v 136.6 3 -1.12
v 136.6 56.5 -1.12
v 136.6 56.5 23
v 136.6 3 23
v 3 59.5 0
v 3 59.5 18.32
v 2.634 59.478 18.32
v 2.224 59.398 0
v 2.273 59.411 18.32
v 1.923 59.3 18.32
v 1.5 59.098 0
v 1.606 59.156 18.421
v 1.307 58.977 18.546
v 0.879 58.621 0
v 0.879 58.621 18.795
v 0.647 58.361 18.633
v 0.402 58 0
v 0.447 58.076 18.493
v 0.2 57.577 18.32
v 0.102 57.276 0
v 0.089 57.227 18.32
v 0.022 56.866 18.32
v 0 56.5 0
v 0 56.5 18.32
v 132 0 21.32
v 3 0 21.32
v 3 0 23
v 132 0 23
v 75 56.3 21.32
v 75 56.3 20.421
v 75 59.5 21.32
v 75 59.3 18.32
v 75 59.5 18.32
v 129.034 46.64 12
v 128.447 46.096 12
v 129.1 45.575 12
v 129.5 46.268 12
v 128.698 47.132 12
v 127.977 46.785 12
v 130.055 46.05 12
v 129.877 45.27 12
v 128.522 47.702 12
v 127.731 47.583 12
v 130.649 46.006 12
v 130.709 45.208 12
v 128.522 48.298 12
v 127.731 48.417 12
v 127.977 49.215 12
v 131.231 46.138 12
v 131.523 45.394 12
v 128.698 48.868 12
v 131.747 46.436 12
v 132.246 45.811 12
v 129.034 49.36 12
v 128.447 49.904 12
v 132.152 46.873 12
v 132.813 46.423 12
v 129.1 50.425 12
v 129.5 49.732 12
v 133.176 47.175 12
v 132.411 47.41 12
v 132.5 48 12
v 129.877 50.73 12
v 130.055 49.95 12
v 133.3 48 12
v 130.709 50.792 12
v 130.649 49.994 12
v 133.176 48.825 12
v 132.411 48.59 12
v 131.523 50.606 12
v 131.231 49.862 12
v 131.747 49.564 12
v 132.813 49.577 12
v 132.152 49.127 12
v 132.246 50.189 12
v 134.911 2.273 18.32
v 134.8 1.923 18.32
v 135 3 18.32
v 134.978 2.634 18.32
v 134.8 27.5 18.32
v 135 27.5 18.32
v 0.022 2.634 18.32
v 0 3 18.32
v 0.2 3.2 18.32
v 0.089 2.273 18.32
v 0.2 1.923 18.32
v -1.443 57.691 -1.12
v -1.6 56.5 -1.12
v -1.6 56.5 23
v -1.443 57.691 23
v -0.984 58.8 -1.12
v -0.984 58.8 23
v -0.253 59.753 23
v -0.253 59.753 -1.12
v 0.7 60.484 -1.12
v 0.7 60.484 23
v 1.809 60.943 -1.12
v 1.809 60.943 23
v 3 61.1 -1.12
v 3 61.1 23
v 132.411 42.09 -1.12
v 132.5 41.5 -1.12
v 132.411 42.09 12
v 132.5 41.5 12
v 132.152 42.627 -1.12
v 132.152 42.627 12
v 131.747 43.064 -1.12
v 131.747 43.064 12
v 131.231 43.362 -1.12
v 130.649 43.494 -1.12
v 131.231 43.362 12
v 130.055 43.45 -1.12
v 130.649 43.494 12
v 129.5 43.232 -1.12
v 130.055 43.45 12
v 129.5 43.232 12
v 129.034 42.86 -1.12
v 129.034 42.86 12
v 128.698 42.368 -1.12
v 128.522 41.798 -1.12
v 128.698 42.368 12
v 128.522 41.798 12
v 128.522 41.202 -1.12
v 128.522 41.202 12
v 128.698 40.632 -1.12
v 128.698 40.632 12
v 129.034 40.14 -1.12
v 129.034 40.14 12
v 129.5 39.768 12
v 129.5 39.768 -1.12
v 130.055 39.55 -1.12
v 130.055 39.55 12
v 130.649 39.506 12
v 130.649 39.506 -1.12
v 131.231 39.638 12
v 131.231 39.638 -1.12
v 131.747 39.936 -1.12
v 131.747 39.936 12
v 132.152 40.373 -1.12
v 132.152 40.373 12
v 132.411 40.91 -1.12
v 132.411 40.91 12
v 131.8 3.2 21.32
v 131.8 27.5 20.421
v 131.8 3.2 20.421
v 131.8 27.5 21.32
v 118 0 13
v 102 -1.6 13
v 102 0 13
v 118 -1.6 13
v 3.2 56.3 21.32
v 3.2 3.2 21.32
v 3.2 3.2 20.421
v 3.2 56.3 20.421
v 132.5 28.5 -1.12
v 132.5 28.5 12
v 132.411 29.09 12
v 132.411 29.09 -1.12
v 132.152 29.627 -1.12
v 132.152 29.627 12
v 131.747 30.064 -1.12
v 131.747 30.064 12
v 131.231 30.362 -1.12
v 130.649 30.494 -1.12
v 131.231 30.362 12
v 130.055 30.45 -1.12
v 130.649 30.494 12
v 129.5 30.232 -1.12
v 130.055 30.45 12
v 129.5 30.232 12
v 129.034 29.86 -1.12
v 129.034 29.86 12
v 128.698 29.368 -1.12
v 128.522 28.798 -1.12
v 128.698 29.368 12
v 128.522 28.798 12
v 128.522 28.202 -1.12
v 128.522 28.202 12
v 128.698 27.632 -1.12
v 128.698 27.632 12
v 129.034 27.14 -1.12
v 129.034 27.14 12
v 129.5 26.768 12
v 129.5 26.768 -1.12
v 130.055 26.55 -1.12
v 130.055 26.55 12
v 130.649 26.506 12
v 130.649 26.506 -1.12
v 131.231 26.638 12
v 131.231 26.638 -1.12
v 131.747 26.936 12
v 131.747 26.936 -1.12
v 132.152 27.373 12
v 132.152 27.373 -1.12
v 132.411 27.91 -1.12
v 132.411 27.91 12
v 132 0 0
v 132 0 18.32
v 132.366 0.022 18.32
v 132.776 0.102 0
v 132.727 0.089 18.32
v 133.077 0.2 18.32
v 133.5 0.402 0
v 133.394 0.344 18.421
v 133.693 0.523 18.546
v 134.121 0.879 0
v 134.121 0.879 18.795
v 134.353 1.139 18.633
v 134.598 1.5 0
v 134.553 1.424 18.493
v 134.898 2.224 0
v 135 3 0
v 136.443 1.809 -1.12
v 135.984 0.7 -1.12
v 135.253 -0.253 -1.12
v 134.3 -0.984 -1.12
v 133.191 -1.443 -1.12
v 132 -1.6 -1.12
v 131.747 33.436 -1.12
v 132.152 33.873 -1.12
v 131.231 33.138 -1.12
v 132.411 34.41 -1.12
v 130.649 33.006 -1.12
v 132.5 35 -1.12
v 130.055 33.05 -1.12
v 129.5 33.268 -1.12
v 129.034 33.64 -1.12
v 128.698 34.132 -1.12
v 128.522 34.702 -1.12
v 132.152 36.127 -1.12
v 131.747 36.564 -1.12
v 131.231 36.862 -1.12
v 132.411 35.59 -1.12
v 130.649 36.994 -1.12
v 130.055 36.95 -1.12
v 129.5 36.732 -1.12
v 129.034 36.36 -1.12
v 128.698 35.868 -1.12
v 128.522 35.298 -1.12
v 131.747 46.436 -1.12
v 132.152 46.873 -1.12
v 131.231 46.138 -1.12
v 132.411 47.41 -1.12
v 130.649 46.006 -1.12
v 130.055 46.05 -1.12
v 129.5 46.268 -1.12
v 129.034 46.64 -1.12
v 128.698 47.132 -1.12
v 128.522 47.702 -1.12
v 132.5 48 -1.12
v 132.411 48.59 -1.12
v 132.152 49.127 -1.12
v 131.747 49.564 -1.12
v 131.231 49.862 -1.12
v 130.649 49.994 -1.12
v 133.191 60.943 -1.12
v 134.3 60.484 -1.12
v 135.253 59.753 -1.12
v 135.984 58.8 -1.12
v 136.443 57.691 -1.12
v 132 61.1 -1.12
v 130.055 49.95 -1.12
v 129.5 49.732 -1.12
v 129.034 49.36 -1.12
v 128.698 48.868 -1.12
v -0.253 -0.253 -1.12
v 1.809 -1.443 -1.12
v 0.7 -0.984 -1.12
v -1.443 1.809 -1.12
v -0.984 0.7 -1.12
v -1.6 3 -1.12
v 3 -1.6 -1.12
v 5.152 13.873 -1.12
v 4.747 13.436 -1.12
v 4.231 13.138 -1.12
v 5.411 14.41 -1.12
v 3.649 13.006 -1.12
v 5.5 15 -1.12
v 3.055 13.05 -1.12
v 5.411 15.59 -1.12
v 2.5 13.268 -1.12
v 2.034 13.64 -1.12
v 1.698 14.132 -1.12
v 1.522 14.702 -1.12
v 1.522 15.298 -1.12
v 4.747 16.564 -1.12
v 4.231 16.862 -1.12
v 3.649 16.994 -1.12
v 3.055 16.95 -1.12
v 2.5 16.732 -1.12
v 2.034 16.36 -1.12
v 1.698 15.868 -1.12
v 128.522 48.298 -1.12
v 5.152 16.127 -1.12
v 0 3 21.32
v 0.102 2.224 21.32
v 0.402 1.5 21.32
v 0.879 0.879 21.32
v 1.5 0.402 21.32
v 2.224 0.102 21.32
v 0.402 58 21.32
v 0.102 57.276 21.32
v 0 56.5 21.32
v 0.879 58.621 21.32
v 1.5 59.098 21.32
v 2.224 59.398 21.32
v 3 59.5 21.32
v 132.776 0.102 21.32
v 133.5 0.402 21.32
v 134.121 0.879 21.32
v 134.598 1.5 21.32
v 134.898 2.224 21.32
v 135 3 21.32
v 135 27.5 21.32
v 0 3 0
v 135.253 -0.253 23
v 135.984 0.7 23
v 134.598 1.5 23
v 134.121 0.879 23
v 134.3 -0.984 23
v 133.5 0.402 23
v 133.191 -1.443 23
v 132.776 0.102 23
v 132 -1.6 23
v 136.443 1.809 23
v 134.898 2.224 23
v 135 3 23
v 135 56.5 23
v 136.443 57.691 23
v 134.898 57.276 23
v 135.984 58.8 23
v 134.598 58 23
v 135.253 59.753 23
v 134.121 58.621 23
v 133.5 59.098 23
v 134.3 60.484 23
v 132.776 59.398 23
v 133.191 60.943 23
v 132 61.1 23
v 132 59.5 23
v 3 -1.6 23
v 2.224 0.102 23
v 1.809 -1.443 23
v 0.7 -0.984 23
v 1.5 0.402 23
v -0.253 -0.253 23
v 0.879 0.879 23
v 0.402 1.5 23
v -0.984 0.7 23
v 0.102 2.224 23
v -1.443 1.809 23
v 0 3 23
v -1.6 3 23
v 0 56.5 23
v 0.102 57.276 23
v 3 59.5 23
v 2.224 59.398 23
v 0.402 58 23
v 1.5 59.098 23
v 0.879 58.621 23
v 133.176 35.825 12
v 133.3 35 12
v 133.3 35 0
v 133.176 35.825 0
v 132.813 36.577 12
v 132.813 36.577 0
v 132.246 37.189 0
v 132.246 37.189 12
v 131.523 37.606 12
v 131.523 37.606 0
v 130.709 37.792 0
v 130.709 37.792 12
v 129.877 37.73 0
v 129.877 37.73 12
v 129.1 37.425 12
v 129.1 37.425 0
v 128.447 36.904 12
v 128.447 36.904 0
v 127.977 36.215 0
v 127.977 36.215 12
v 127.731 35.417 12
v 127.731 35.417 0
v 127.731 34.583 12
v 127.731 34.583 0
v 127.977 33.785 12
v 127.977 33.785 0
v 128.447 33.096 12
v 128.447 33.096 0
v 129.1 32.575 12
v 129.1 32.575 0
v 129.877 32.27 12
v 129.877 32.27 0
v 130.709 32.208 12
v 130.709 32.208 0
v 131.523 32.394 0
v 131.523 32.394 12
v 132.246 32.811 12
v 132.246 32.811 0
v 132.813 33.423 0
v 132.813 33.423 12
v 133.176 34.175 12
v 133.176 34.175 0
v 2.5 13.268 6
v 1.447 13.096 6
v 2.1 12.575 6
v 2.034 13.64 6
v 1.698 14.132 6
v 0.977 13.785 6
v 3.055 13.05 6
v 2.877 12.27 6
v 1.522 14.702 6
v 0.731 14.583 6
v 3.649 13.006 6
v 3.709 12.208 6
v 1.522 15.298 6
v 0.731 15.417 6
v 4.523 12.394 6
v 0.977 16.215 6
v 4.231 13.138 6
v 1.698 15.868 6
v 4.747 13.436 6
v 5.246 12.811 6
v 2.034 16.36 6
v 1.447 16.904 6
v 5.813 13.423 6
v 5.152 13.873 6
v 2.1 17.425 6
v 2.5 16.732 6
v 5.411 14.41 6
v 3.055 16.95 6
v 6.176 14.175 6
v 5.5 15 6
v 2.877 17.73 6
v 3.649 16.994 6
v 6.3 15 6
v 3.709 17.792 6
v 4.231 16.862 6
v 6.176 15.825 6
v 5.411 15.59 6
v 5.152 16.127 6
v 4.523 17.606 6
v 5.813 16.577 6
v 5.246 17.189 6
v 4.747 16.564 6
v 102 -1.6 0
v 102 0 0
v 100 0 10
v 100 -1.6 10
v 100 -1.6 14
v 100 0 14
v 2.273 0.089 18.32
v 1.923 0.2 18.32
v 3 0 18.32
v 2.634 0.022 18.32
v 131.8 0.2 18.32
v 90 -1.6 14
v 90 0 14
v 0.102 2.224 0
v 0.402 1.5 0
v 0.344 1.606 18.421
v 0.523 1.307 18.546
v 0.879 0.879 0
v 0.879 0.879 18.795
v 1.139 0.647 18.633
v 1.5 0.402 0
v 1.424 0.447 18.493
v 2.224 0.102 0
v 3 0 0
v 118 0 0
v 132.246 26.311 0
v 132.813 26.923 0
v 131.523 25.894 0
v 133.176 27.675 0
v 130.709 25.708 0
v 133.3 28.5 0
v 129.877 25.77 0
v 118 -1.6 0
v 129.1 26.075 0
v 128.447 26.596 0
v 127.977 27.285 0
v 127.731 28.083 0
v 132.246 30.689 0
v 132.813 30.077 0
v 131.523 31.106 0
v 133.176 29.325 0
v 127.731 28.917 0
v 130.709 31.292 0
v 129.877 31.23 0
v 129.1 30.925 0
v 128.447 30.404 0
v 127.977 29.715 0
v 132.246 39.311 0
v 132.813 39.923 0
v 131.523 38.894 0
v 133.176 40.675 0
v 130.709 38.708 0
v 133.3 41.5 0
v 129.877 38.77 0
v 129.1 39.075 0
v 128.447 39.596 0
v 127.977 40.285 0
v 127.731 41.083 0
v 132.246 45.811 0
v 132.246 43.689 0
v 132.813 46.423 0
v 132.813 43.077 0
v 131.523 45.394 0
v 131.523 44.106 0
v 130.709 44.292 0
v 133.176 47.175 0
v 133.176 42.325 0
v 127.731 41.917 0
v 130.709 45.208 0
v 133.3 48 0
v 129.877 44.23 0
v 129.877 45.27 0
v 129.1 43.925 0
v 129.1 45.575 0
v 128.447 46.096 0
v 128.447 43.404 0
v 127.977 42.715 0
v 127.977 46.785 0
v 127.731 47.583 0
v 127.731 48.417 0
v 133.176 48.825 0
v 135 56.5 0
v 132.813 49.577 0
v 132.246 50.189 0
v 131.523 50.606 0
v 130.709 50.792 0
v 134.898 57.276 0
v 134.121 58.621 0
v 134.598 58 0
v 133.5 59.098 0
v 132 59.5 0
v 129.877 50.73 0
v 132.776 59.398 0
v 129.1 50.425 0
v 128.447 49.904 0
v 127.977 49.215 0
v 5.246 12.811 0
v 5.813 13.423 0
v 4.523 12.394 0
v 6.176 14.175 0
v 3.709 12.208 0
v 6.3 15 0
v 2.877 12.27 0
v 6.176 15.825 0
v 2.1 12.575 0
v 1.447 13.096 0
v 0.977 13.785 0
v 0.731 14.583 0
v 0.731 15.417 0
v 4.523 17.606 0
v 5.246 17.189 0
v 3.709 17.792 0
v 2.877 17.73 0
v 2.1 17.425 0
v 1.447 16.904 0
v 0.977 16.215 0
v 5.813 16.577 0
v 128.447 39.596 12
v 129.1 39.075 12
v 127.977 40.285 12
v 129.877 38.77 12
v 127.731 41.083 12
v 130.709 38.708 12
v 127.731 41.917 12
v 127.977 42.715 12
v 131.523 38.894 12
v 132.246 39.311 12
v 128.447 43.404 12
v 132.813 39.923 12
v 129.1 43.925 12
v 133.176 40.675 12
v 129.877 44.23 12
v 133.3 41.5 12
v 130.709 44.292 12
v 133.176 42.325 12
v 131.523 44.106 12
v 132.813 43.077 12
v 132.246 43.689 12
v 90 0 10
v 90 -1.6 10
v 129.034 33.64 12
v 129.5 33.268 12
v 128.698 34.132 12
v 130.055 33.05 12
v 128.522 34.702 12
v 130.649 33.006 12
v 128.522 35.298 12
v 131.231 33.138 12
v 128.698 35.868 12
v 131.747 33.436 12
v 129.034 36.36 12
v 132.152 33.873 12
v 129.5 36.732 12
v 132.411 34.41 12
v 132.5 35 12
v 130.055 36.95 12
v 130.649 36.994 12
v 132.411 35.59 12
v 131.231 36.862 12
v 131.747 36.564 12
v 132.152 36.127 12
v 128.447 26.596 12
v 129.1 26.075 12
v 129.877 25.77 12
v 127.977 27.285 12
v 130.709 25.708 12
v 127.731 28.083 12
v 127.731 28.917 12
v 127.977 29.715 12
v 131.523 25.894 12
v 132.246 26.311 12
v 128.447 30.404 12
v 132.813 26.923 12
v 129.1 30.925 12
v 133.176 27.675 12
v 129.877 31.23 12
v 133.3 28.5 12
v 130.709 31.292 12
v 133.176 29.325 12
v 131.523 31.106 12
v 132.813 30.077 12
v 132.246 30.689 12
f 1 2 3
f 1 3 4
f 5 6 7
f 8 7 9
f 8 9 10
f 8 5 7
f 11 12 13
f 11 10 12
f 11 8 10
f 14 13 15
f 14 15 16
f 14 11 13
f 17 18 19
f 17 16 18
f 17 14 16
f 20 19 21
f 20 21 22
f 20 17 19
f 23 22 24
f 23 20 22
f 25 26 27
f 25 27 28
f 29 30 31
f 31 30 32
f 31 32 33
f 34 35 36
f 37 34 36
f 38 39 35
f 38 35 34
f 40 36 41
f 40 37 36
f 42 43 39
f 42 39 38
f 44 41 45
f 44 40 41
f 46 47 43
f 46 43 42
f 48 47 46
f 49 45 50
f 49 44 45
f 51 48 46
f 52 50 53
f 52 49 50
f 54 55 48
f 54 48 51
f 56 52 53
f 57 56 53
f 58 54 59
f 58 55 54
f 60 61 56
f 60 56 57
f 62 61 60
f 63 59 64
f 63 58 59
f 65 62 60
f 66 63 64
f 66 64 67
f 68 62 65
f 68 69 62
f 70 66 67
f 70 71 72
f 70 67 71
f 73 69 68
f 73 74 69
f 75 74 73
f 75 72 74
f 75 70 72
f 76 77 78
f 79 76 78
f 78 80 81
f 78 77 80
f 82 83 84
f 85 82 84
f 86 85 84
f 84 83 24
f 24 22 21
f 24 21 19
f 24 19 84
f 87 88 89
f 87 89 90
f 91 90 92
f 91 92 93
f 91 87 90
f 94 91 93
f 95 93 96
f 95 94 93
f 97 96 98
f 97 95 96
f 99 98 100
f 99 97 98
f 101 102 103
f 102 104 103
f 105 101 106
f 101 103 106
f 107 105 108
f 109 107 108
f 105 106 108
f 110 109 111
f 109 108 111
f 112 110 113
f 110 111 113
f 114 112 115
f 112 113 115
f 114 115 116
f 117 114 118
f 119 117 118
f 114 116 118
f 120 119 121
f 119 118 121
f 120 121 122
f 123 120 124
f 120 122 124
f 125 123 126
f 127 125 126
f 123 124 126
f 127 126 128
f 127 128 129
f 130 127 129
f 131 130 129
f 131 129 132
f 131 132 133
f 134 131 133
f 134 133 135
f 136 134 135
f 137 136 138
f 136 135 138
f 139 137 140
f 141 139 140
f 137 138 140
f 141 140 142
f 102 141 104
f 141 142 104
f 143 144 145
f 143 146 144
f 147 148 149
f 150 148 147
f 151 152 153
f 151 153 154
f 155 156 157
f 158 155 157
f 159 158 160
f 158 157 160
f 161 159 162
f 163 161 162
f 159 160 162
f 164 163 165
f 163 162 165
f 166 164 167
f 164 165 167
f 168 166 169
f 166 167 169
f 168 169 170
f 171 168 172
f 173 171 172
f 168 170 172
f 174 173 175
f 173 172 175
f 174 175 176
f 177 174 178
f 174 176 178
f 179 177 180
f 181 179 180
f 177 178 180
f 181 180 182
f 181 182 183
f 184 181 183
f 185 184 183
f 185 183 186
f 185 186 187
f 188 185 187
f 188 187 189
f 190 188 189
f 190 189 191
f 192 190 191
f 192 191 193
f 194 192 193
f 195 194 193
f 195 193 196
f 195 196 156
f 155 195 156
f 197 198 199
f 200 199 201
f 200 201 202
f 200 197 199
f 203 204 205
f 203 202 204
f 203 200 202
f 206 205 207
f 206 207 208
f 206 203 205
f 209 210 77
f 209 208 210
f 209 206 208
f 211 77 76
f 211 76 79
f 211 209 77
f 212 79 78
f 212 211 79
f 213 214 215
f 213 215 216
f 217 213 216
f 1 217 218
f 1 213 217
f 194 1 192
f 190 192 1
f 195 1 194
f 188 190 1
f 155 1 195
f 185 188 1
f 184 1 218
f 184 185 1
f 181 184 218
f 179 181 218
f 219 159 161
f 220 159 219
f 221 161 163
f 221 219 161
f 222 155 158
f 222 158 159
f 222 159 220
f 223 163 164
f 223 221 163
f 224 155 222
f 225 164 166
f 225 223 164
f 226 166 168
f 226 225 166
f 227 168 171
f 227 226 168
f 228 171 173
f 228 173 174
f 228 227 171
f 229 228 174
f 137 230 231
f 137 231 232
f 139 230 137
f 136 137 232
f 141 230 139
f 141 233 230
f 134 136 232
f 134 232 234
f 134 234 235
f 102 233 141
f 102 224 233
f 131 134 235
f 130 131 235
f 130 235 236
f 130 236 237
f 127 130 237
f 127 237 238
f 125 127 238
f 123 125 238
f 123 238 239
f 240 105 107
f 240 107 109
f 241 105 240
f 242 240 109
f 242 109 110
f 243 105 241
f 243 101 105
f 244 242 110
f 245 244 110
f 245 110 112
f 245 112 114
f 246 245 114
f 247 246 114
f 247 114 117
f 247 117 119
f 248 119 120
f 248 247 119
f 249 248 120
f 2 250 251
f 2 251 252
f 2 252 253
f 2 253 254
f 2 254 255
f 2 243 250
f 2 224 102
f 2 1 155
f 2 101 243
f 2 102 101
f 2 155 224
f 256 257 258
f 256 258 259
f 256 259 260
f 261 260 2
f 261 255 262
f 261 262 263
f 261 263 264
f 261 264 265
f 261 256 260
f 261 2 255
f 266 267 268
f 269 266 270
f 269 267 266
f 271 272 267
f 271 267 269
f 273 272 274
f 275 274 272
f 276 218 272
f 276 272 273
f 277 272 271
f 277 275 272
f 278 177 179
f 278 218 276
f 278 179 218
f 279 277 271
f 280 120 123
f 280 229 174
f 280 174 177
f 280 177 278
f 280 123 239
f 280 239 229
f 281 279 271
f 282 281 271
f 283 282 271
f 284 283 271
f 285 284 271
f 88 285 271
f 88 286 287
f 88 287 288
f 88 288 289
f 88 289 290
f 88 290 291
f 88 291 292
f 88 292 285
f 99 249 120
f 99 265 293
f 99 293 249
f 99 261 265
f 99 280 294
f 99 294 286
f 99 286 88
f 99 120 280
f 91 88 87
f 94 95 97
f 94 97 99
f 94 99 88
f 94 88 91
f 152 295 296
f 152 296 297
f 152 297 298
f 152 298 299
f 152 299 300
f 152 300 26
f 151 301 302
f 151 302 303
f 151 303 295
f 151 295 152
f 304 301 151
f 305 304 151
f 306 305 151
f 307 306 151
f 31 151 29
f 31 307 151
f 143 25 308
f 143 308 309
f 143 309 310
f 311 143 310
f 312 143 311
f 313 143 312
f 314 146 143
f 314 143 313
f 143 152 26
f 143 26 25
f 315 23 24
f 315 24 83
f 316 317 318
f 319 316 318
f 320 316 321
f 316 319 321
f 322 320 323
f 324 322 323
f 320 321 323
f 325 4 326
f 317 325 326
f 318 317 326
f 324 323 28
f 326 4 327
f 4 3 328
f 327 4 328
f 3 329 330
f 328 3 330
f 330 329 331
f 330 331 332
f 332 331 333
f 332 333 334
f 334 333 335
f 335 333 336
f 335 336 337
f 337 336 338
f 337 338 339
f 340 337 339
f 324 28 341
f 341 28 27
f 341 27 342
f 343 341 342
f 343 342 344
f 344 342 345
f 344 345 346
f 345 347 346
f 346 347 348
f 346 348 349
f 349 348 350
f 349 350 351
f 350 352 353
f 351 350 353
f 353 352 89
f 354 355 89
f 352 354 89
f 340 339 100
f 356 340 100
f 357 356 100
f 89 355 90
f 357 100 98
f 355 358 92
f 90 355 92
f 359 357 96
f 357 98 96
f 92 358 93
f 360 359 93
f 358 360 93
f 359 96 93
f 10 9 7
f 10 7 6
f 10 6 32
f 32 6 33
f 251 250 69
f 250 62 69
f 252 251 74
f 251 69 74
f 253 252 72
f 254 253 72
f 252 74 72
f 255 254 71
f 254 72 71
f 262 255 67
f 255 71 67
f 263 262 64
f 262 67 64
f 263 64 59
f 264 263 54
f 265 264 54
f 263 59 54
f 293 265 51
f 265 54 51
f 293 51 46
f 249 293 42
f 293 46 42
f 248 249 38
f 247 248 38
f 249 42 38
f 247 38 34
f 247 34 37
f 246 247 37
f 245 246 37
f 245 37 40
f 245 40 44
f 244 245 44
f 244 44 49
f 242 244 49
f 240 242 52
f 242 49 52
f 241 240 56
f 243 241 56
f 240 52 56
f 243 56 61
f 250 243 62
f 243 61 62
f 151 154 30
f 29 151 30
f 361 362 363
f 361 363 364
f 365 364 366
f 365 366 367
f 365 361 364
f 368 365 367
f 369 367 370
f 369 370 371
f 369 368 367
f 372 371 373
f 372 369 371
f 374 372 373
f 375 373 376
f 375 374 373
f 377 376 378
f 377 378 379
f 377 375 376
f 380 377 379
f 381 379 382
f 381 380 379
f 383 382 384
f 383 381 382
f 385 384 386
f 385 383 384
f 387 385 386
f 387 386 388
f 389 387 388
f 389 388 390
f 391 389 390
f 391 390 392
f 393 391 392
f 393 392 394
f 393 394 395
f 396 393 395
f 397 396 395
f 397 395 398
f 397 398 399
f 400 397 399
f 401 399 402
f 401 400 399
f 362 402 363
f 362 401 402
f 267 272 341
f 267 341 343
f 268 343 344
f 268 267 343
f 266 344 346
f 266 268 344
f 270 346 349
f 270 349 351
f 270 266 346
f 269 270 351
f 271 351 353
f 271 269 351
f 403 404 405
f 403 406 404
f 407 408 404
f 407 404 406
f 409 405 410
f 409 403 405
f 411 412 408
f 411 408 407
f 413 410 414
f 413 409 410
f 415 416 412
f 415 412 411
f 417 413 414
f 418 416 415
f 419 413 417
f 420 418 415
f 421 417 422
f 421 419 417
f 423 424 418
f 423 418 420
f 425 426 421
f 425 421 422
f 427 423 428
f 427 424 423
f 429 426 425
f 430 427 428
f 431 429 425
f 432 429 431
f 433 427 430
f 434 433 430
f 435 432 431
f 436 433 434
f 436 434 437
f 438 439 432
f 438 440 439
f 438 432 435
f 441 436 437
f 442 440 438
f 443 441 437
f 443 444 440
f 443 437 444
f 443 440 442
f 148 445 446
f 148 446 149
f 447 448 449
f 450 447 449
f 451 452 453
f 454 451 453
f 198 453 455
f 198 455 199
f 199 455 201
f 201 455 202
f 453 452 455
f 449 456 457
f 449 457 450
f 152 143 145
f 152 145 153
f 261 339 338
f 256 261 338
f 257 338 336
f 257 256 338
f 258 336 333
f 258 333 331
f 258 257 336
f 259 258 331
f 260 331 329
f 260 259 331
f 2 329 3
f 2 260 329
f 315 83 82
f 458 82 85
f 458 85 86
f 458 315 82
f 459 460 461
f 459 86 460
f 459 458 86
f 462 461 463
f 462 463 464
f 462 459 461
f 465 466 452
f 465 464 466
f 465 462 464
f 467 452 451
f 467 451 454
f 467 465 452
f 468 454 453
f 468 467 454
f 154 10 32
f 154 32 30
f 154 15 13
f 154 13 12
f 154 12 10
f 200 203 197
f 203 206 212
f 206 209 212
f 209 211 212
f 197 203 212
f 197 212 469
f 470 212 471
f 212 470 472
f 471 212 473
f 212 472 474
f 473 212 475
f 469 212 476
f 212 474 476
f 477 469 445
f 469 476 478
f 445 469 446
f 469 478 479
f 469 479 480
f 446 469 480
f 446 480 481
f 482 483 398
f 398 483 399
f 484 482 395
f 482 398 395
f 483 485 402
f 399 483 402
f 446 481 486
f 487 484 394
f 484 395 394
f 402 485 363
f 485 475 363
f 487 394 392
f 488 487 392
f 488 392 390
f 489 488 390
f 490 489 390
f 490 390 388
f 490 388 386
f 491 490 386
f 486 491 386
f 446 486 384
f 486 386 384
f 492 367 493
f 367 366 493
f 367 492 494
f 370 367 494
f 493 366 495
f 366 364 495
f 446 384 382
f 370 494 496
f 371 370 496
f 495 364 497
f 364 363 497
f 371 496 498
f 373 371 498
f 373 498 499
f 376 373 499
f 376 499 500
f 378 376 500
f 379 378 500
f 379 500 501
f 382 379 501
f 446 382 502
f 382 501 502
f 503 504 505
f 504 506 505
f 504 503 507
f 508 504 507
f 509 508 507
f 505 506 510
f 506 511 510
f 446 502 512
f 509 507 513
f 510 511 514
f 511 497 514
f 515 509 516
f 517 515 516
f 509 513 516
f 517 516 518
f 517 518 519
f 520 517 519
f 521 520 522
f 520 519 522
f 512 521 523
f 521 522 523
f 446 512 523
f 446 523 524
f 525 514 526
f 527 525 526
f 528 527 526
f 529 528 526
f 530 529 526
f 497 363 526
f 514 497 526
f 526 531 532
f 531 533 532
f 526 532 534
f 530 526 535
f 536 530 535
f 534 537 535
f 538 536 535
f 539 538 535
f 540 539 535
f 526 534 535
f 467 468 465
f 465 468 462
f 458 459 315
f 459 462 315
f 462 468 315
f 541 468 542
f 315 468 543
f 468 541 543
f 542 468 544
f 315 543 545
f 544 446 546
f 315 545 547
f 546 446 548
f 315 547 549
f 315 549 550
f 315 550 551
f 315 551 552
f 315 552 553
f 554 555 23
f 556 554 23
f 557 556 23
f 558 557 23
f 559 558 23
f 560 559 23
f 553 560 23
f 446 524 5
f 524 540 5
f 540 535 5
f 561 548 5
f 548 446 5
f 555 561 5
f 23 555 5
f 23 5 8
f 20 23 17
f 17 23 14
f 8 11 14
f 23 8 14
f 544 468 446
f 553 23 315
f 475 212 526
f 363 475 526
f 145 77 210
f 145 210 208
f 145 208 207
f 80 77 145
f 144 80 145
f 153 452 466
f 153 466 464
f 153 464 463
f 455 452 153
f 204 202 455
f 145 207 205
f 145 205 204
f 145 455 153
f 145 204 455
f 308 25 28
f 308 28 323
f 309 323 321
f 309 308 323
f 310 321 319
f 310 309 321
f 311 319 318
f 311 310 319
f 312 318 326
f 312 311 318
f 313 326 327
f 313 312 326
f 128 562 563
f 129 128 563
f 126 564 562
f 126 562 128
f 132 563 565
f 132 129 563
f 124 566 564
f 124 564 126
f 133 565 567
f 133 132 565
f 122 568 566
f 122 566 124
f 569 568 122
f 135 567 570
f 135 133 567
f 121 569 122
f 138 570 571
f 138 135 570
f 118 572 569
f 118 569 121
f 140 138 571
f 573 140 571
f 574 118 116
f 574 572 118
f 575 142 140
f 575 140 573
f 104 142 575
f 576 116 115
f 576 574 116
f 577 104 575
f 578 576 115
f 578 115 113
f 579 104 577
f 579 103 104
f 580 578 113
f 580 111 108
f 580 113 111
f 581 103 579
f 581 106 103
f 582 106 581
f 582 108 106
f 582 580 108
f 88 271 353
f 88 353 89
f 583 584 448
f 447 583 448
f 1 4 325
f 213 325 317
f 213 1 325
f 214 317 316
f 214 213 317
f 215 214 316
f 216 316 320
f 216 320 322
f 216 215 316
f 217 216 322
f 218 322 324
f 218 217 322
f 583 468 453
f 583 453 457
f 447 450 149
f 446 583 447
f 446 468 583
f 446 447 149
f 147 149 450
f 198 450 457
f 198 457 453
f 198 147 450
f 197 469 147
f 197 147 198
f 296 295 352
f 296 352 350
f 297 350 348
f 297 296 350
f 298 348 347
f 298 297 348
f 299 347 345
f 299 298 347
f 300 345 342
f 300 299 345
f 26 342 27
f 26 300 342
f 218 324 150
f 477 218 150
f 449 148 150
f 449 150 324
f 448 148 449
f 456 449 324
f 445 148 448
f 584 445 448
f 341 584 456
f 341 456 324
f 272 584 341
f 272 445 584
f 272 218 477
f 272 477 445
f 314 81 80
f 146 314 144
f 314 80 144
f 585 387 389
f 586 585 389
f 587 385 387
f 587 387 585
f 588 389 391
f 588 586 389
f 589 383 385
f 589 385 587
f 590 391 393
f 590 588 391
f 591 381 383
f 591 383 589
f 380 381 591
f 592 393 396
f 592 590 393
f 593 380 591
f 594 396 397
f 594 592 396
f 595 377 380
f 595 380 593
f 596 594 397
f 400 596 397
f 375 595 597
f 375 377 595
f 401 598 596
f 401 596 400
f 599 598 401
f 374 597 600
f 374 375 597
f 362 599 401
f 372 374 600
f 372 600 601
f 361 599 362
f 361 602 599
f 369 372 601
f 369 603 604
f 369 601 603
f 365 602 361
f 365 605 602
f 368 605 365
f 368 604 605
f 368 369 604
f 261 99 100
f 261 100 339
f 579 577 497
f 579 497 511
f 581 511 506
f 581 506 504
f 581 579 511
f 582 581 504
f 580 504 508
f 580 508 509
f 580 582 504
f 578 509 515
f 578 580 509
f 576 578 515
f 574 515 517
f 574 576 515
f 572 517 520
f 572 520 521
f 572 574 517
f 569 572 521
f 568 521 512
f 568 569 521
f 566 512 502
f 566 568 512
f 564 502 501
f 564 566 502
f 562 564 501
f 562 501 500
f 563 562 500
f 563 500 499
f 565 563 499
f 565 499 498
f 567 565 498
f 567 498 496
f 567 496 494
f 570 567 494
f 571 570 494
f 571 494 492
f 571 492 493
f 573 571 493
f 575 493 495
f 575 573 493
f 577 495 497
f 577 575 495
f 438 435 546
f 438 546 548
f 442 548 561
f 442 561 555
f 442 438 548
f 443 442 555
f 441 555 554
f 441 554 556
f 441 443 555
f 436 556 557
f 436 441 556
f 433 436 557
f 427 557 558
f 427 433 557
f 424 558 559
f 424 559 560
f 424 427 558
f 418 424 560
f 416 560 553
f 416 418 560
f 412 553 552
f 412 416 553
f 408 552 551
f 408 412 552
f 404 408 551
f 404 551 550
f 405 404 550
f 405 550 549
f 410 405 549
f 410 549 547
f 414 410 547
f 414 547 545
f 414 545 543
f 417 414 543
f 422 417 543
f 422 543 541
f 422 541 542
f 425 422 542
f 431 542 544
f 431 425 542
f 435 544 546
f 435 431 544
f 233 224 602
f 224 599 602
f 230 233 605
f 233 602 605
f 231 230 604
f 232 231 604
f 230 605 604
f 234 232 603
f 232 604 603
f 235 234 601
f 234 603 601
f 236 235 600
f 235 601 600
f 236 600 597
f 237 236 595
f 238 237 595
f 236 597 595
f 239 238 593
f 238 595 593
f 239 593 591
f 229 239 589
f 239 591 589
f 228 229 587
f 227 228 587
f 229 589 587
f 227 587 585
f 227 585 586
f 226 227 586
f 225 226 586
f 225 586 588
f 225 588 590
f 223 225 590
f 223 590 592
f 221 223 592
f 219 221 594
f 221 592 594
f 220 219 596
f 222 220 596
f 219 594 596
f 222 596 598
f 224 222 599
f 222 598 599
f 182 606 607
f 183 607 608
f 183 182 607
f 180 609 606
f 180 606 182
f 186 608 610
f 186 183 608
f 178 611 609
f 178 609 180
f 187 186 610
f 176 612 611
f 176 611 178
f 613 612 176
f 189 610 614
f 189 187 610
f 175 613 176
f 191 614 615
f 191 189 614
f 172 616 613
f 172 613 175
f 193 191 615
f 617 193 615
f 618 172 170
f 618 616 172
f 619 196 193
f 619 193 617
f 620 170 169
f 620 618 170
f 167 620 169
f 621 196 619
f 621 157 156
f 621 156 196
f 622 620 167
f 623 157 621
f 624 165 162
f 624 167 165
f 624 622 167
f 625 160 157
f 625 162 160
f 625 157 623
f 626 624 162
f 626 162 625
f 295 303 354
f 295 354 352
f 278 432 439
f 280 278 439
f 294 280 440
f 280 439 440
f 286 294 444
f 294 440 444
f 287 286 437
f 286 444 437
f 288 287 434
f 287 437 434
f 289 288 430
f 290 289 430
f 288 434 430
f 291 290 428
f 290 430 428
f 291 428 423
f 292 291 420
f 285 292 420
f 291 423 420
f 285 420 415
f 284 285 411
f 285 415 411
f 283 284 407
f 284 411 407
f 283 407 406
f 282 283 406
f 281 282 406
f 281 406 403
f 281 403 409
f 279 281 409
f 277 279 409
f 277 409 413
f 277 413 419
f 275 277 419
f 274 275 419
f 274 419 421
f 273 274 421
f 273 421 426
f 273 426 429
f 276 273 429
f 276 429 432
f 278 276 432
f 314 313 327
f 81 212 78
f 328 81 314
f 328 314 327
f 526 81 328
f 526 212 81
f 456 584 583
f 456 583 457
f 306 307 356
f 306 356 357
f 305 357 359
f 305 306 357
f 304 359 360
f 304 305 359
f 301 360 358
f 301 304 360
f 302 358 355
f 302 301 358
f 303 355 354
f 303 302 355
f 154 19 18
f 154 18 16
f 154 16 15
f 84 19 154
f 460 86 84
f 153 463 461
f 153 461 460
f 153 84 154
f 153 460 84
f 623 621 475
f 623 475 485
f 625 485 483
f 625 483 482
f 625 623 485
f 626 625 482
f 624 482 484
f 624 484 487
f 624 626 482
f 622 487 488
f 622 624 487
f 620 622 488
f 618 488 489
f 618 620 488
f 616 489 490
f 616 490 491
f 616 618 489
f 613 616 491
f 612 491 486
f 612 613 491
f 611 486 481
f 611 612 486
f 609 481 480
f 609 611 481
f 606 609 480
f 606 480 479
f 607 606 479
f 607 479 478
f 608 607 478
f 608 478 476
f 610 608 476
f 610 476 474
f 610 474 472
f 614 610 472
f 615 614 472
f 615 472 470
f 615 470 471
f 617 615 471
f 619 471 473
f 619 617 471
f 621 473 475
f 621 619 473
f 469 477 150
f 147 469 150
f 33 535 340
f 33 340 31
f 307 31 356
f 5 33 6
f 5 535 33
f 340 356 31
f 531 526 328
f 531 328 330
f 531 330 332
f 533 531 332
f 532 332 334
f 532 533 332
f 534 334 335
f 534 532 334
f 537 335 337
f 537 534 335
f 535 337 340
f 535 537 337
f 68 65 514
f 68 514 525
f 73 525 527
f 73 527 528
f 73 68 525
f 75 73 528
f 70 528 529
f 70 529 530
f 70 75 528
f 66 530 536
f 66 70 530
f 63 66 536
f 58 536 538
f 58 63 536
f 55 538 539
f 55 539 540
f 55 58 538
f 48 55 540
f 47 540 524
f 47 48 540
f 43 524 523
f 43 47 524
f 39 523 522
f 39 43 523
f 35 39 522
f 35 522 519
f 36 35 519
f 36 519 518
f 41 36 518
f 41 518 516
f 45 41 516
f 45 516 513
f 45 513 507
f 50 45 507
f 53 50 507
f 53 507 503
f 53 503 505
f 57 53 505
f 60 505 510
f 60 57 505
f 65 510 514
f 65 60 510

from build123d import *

# Parameters (mm, degrees)
PARED_DEPTH             = 23
CONECTORES_REACH        = 154.052
CROQUIS2_W              = 16
CROQUIS2_H              = 13
CROQUIS2_W_2            = 10
CROQUIS2_H_2            = 4
BASE_START              = -1.12
BASE_FRENTE_DEPTH       = 1.12
LUCES_REACH             = 153.399
CROQUIS3_R              = 2
SALIENTE_EXTRUIR1_START = 12
CROQUIS3_3_R            = 2.8
CROQUIS3_3_R_2          = 2
SALIENTE_EXTRUIR1_DEPTH = 12
SALIENTE_EXTRUIR3_START = 6
CROQUIS3_5_R            = 2.8
CROQUIS3_5_R_2          = 2
SALIENTE_EXTRUIR3_DEPTH = 6
SALIENTE_EXTRUIR4_START = -4.68
SALIENTE_EXTRUIR4_DEPTH = 3


with BuildPart() as part:
    # Croquis1 → pared (new body)
    with BuildSketch(Plane.XY):
        with BuildLine():
            Line((3, 61.1), (132, 61.1))
            ThreePointArc((132, 61.1), (135.252691193, 59.752691193), (136.6, 56.5))
            Line((136.6, 56.5), (136.6, 3))
            ThreePointArc((136.6, 3), (135.252691193, -0.252691193), (132, -1.6))
            Line((132, -1.6), (3, -1.6))
            ThreePointArc((3, -1.6), (-0.252691193, -0.252691193), (-1.6, 3))
            Line((-1.6, 3), (-1.6, 56.5))
            ThreePointArc((-1.6, 56.5), (-0.252691193, 59.752691193), (3, 61.1))
        make_face()
        with BuildLine():
            Line((3, 0), (132, 0))
            ThreePointArc((132, 0), (134.121320344, 0.878679656), (135, 3))
            Line((135, 3), (135, 56.5))
            ThreePointArc((135, 56.5), (134.121320344, 58.621320344), (132, 59.5))
            Line((132, 59.5), (3, 59.5))
            ThreePointArc((3, 59.5), (0.878679656, 58.621320344), (0, 56.5))
            Line((0, 56.5), (0, 3))
            ThreePointArc((0, 3), (0.878679656, 0.878679656), (3, 0))
        make_face(mode=Mode.SUBTRACT)
    extrude(amount=PARED_DEPTH)

    # Croquis2 → conectores (cut, up to next)
    with BuildSketch(Plane.XZ.offset(1.6), mode=Mode.PRIVATE) as conectores_sk1:
        with Locations((110, 6.5)):
            Rectangle(CROQUIS2_W, CROQUIS2_H)
    conectores_tool1 = extrude(conectores_sk1.sketch, amount=-CONECTORES_REACH, mode=Mode.PRIVATE) & part.part
    # Croquis2 → conectores (cut, up to next)
    with BuildSketch(Plane.XZ.offset(1.6), mode=Mode.PRIVATE) as conectores_sk2:
        with Locations((95, 12)):
            Rectangle(CROQUIS2_W_2, CROQUIS2_H_2)
    conectores_tool2 = extrude(conectores_sk2.sketch, amount=-CONECTORES_REACH, mode=Mode.PRIVATE) & part.part
    add(conectores_tool1.solids().sort_by_distance((110, -1.6, 6.5))[0], mode=Mode.SUBTRACT)
    add(conectores_tool2.solids().sort_by_distance((95, -1.6, 12))[0], mode=Mode.SUBTRACT)

    # Croquis1<2> → base frente (add)
    with BuildSketch(Plane.XY.offset(BASE_START)):
        with BuildLine():
            Line((3, 61.1), (132, 61.1))
            ThreePointArc((132, 61.1), (135.252691193, 59.752691193), (136.6, 56.5))
            Line((136.6, 56.5), (136.6, 3))
            ThreePointArc((136.6, 3), (135.252691193, -0.252691193), (132, -1.6))
            Line((132, -1.6), (3, -1.6))
            ThreePointArc((3, -1.6), (-0.252691193, -0.252691193), (-1.6, 3))
            Line((-1.6, 3), (-1.6, 56.5))
            ThreePointArc((-1.6, 56.5), (-0.252691193, 59.752691193), (3, 61.1))
        make_face()
    extrude(amount=BASE_FRENTE_DEPTH)

    # Croquis3 → luces (cut, up to next)
    with BuildSketch(Plane.XY, mode=Mode.PRIVATE) as luces_sk1:
        with Locations((130.5, 48)):
            Circle(CROQUIS3_R)
    luces_tool1 = extrude(luces_sk1.sketch, amount=-LUCES_REACH, mode=Mode.PRIVATE) & part.part
    # Croquis3 → luces (cut, up to next)
    with BuildSketch(Plane.XY, mode=Mode.PRIVATE) as luces_sk2:
        with Locations((130.5, 41.5)):
            Circle(CROQUIS3_R)
    luces_tool2 = extrude(luces_sk2.sketch, amount=-LUCES_REACH, mode=Mode.PRIVATE) & part.part
    # Croquis3 → luces (cut, up to next)
    with BuildSketch(Plane.XY, mode=Mode.PRIVATE) as luces_sk3:
        with Locations((130.5, 35)):
            Circle(CROQUIS3_R)
    luces_tool3 = extrude(luces_sk3.sketch, amount=-LUCES_REACH, mode=Mode.PRIVATE) & part.part
    # Croquis3 → luces (cut, up to next)
    with BuildSketch(Plane.XY, mode=Mode.PRIVATE) as luces_sk4:
        with Locations((130.5, 28.5)):
            Circle(CROQUIS3_R)
    luces_tool4 = extrude(luces_sk4.sketch, amount=-LUCES_REACH, mode=Mode.PRIVATE) & part.part
    # Croquis3 → luces (cut, up to next)
    with BuildSketch(Plane.XY, mode=Mode.PRIVATE) as luces_sk5:
        with Locations((3.5, 15)):
            Circle(CROQUIS3_R)
    luces_tool5 = extrude(luces_sk5.sketch, amount=-LUCES_REACH, mode=Mode.PRIVATE) & part.part
    add(luces_tool1.solids().sort_by_distance((130.5, 48, 0))[0], mode=Mode.SUBTRACT)
    add(luces_tool2.solids().sort_by_distance((130.5, 41.5, 0))[0], mode=Mode.SUBTRACT)
    add(luces_tool3.solids().sort_by_distance((130.5, 35, 0))[0], mode=Mode.SUBTRACT)
    add(luces_tool4.solids().sort_by_distance((130.5, 28.5, 0))[0], mode=Mode.SUBTRACT)
    add(luces_tool5.solids().sort_by_distance((3.5, 15, 0))[0], mode=Mode.SUBTRACT)

    # Croquis3<3> → Saliente-Extruir1 (add)
    # profile 1 of 4: a face of its own
    with BuildSketch(Plane.XY.offset(SALIENTE_EXTRUIR1_START)):
        with Locations((130.5, 28.5)):
            Circle(CROQUIS3_3_R)
        with Locations((130.5, 28.5)):
            Circle(CROQUIS3_3_R_2, mode=Mode.SUBTRACT)
    # profile 2 of 4: a face of its own
    with BuildSketch(Plane.XY.offset(SALIENTE_EXTRUIR1_START)):
        with Locations((130.5, 35)):
            Circle(CROQUIS3_3_R)
        with Locations((130.5, 35)):
            Circle(CROQUIS3_3_R_2, mode=Mode.SUBTRACT)
    # profile 3 of 4: a face of its own
    with BuildSketch(Plane.XY.offset(SALIENTE_EXTRUIR1_START)):
        with Locations((130.5, 41.5)):
            Circle(CROQUIS3_3_R)
        with Locations((130.5, 41.5)):
            Circle(CROQUIS3_3_R_2, mode=Mode.SUBTRACT)
    # profile 4 of 4: a face of its own
    with BuildSketch(Plane.XY.offset(SALIENTE_EXTRUIR1_START)):
        with Locations((130.5, 48)):
            Circle(CROQUIS3_3_R)
        with Locations((130.5, 48)):
            Circle(CROQUIS3_3_R_2, mode=Mode.SUBTRACT)
    extrude(amount=-SALIENTE_EXTRUIR1_DEPTH)

    # Croquis3<5> → Saliente-Extruir3 (add)
    with BuildSketch(Plane.XY.offset(SALIENTE_EXTRUIR3_START)):
        with Locations((3.5, 15)):
            Circle(CROQUIS3_5_R)
        with Locations((3.5, 15)):
            Circle(CROQUIS3_5_R_2, mode=Mode.SUBTRACT)
    extrude(amount=-SALIENTE_EXTRUIR3_DEPTH)

    # Croquis5 → Saliente-Extruir4 (add)
    with BuildSketch(Plane.XY.offset(23).offset(SALIENTE_EXTRUIR4_START)):
        with BuildLine():
            ThreePointArc((3, 59.5), (0.878679656, 58.621320344), (0, 56.5))
            Line((0, 56.5), (0, 3))
            ThreePointArc((0, 3), (0.878679656, 0.878679656), (3, 0))
            Line((3, 0), (132, 0))
            ThreePointArc((132, 0), (134.121320344, 0.878679656), (135, 3))
            Line((135, 3), (135, 27.5))
            Line((135, 27.5), (131.8, 27.5))
            Line((131.8, 27.5), (131.8, 3.2))
            Line((131.8, 3.2), (3.2, 3.2))
            Line((3.2, 3.2), (3.2, 56.3))
            Line((3.2, 56.3), (75, 56.3))
            Line((75, 56.3), (75, 59.5))
            Line((75, 59.5), (3, 59.5))
        make_face()
    extrude(amount=SALIENTE_EXTRUIR4_DEPTH)

    # Chaflán1
    # the kernel refuses this chamfer: 3, 2.100622615 mm, written as the material it takes off along each edge
    with BuildSketch(Plane(origin=(3.2, 56.3, 18.32), x_dir=(0, 0.9997533347641299, -0.022209674198456996), z_dir=(1, 0, 0))) as chafl_n1_piece_1:
        with BuildLine():
            Line((3.099062676, 0), (-0.146456816, 2.166733487))
            Line((-0.146456816, 2.166733487), (-0.206442016, 2.165400906))
            ThreePointArc((-0.206442016, 2.165400906), (-0.084076609, 1.083125749), (-0.0599852, -0.00133258))
            Line((-0.0599852, -0.00133258), (0.00133258, -0.0599852))
            ThreePointArc((0.00133258, -0.0599852), (1.550099582, -0.025579103), (3.100395257, -0.0599852))
            Line((3.100395257, -0.0599852), (3.099062676, 0))
        make_face()
    extrude(amount=71.8, mode=Mode.SUBTRACT)
    with BuildSketch(Plane(origin=(3.2, 3.2, 18.32), x_dir=(-0.9997533347641299, 0, -0.02220967419845701), z_dir=(0, 1, 0))) as chafl_n1_piece_2:
        with BuildLine():
            Line((3.099062676, 0), (-0.146456816, 2.166733487))
            Line((-0.146456816, 2.166733487), (-0.206442016, 2.165400906))
            ThreePointArc((-0.206442016, 2.165400906), (-0.084076609, 1.083125749), (-0.0599852, -0.00133258))
            Line((-0.0599852, -0.00133258), (0.00133258, -0.0599852))
            ThreePointArc((0.00133258, -0.0599852), (1.550099582, -0.025579103), (3.100395257, -0.0599852))
            Line((3.100395257, -0.0599852), (3.099062676, 0))
        make_face()
    extrude(amount=53.1, mode=Mode.SUBTRACT)
    with BuildSketch(Plane(origin=(131.8, 3.2, 18.32), x_dir=(0, -0.99975333476413, -0.022209674198457003), z_dir=(-1, 0, 0))) as chafl_n1_piece_3:
        with BuildLine():
            Line((3.099062676, 0), (-0.146456816, 2.166733487))
            Line((-0.146456816, 2.166733487), (-0.206442016, 2.165400906))
            ThreePointArc((-0.206442016, 2.165400906), (-0.084076609, 1.083125749), (-0.0599852, -0.00133258))
            Line((-0.0599852, -0.00133258), (0.00133258, -0.0599852))
            ThreePointArc((0.00133258, -0.0599852), (1.550099582, -0.025579103), (3.100395257, -0.0599852))
            Line((3.100395257, -0.0599852), (3.099062676, 0))
        make_face()
    extrude(amount=128.6, mode=Mode.SUBTRACT)
    with BuildSketch(Plane(origin=(131.8, 27.5, 18.32), x_dir=(0.9997533347641299, 0, -0.022209674198456996), z_dir=(0, -1, 0))) as chafl_n1_piece_4:
        with BuildLine():
            Line((3.099062676, 0), (-0.146456816, 2.166733487))
            Line((-0.146456816, 2.166733487), (-0.206442016, 2.165400906))
            ThreePointArc((-0.206442016, 2.165400906), (-0.084076609, 1.083125749), (-0.0599852, -0.00133258))
            Line((-0.0599852, -0.00133258), (0.00133258, -0.0599852))
            ThreePointArc((0.00133258, -0.0599852), (1.550099582, -0.025579103), (3.100395257, -0.0599852))
            Line((3.100395257, -0.0599852), (3.099062676, 0))
        make_face()
    extrude(amount=24.3, mode=Mode.SUBTRACT)
    with BuildSketch(Plane(origin=(3.2, 3.2, 18.32), x_dir=(-0.9997533347641299, 0, -0.02220967419845701), z_dir=(0, 1, 0))) as chafl_n1_piece_5a_section:
        with BuildLine():
            Line((3.099062676, 0), (-0.146456816, 2.166733487))
            Line((-0.146456816, 2.166733487), (-0.206442016, 2.165400906))
            ThreePointArc((-0.206442016, 2.165400906), (-0.084076609, 1.083125749), (-0.0599852, -0.00133258))
            Line((-0.0599852, -0.00133258), (0.00133258, -0.0599852))
            ThreePointArc((0.00133258, -0.0599852), (1.550099582, -0.025579103), (3.100395257, -0.0599852))
            Line((3.100395257, -0.0599852), (3.099062676, 0))
        make_face()
    chafl_n1_piece_5a = extrude(amount=60.847656691, mode=Mode.PRIVATE)
    chafl_n1_piece_5a = chafl_n1_piece_5a & Plane(origin=(3, 56.5, 19.031713665), x_dir=(0, 1, 0), z_dir=(0, 0, -1)) * Cylinder(3, 135, mode=Mode.PRIVATE)
    chafl_n1_piece_5a = split(chafl_n1_piece_5a, bisect_by=Plane(origin=(2.281590603, 56.3, 19.031713665), z_dir=(0, 1, 0)), keep=Keep.TOP, mode=Mode.PRIVATE)
    with BuildSketch(Plane(origin=(-4.547656691, 56.3, 18.32), x_dir=(0, 0.9997533347641299, -0.022209674198456996), z_dir=(1, 0, 0))) as chafl_n1_piece_5b_section:
        with BuildLine():
            Line((3.099062676, 0), (-0.146456816, 2.166733487))
            Line((-0.146456816, 2.166733487), (-0.206442016, 2.165400906))
            ThreePointArc((-0.206442016, 2.165400906), (-0.084076609, 1.083125749), (-0.0599852, -0.00133258))
            Line((-0.0599852, -0.00133258), (0.00133258, -0.0599852))
            ThreePointArc((0.00133258, -0.0599852), (1.550099582, -0.025579103), (3.100395257, -0.0599852))
            Line((3.100395257, -0.0599852), (3.099062676, 0))
        make_face()
    chafl_n1_piece_5b = extrude(amount=79.547656691, mode=Mode.PRIVATE)
    chafl_n1_piece_5b = chafl_n1_piece_5b & Plane(origin=(3, 56.5, 19.03171372), x_dir=(0, 1, 0), z_dir=(0, 0, -1)) * Cylinder(3, 172, mode=Mode.PRIVATE)
    chafl_n1_piece_5b = split(chafl_n1_piece_5b, bisect_by=Plane(origin=(3.2, 57.218409394, 19.03171372), z_dir=(-1, 0, 0)), keep=Keep.TOP, mode=Mode.PRIVATE)
    chafl_n1_piece_5 = chafl_n1_piece_5a & chafl_n1_piece_5b
    add(chafl_n1_piece_5, mode=Mode.SUBTRACT)
    with BuildSketch(Plane(origin=(131.8, 3.2, 18.32), x_dir=(0, -0.99975333476413, -0.022209674198457003), z_dir=(-1, 0, 0))) as chafl_n1_piece_6a_section:
        with BuildLine():
            Line((3.099062676, 0), (-0.146456816, 2.166733487))
            Line((-0.146456816, 2.166733487), (-0.206442016, 2.165400906))
            ThreePointArc((-0.206442016, 2.165400906), (-0.084076609, 1.083125749), (-0.0599852, -0.00133258))
            Line((-0.0599852, -0.00133258), (0.00133258, -0.0599852))
            ThreePointArc((0.00133258, -0.0599852), (1.550099582, -0.025579103), (3.100395257, -0.0599852))
            Line((3.100395257, -0.0599852), (3.099062676, 0))
        make_face()
    chafl_n1_piece_6a = extrude(amount=136.347656691, mode=Mode.PRIVATE)
    chafl_n1_piece_6a = chafl_n1_piece_6a & Plane(origin=(3, 3, 19.031713665), x_dir=(-1, 0, 0), z_dir=(0, 0, -1)) * Cylinder(3, 286, mode=Mode.PRIVATE)
    chafl_n1_piece_6a = split(chafl_n1_piece_6a, bisect_by=Plane(origin=(3.2, 2.281590603, 19.031713665), z_dir=(-1, 0, 0)), keep=Keep.TOP, mode=Mode.PRIVATE)
    with BuildSketch(Plane(origin=(3.2, -4.547656691, 18.32), x_dir=(-0.99975333476413, 0, -0.02220967419845701), z_dir=(0, 1, 0))) as chafl_n1_piece_6b_section:
        with BuildLine():
            Line((3.099062676, 0), (-0.146456816, 2.166733487))
            Line((-0.146456816, 2.166733487), (-0.206442016, 2.165400906))
            ThreePointArc((-0.206442016, 2.165400906), (-0.084076609, 1.083125749), (-0.0599852, -0.00133258))
            Line((-0.0599852, -0.00133258), (0.00133258, -0.0599852))
            ThreePointArc((0.00133258, -0.0599852), (1.550099582, -0.025579103), (3.100395257, -0.0599852))
            Line((3.100395257, -0.0599852), (3.099062676, 0))
        make_face()
    chafl_n1_piece_6b = extrude(amount=60.847656691, mode=Mode.PRIVATE)
    chafl_n1_piece_6b = chafl_n1_piece_6b & Plane(origin=(3, 3, 19.03171372), x_dir=(-1, 0, 0), z_dir=(0, 0, -1)) * Cylinder(3, 135, mode=Mode.PRIVATE)
    chafl_n1_piece_6b = split(chafl_n1_piece_6b, bisect_by=Plane(origin=(2.281590606, 3.2, 19.03171372), z_dir=(0, -1, 0)), keep=Keep.TOP, mode=Mode.PRIVATE)
    chafl_n1_piece_6 = chafl_n1_piece_6a & chafl_n1_piece_6b
    add(chafl_n1_piece_6, mode=Mode.SUBTRACT)
    with BuildSketch(Plane(origin=(131.8, 27.5, 18.32), x_dir=(0.9997533347641299, 0, -0.022209674198456996), z_dir=(0, -1, 0))) as chafl_n1_piece_7a_section:
        with BuildLine():
            Line((3.099062676, 0), (-0.146456816, 2.166733487))
            Line((-0.146456816, 2.166733487), (-0.206442016, 2.165400906))
            ThreePointArc((-0.206442016, 2.165400906), (-0.084076609, 1.083125749), (-0.0599852, -0.00133258))
            Line((-0.0599852, -0.00133258), (0.00133258, -0.0599852))
            ThreePointArc((0.00133258, -0.0599852), (1.550099582, -0.025579103), (3.100395257, -0.0599852))
            Line((3.100395257, -0.0599852), (3.099062676, 0))
        make_face()
    chafl_n1_piece_7a = extrude(amount=32.047656691, mode=Mode.PRIVATE)
    chafl_n1_piece_7a = chafl_n1_piece_7a & Plane(origin=(132, 3, 19.031713665), x_dir=(0, -1, 0), z_dir=(0, 0, -1)) * Cylinder(3, 77, mode=Mode.PRIVATE)
    chafl_n1_piece_7a = split(chafl_n1_piece_7a, bisect_by=Plane(origin=(132.718409397, 3.2, 19.031713665), z_dir=(0, -1, 0)), keep=Keep.TOP, mode=Mode.PRIVATE)
    with BuildSketch(Plane(origin=(139.547656691, 3.2, 18.32), x_dir=(0, -0.99975333476413, -0.02220967419845701), z_dir=(-1, 0, 0))) as chafl_n1_piece_7b_section:
        with BuildLine():
            Line((3.099062676, 0), (-0.146456816, 2.166733487))
            Line((-0.146456816, 2.166733487), (-0.206442016, 2.165400906))
            ThreePointArc((-0.206442016, 2.165400906), (-0.084076609, 1.083125749), (-0.0599852, -0.00133258))
            Line((-0.0599852, -0.00133258), (0.00133258, -0.0599852))
            ThreePointArc((0.00133258, -0.0599852), (1.550099582, -0.025579103), (3.100395257, -0.0599852))
            Line((3.100395257, -0.0599852), (3.099062676, 0))
        make_face()
    chafl_n1_piece_7b = extrude(amount=136.347656691, mode=Mode.PRIVATE)
    chafl_n1_piece_7b = chafl_n1_piece_7b & Plane(origin=(132, 3, 19.03171372), x_dir=(0, -1, 0), z_dir=(0, 0, -1)) * Cylinder(3, 286, mode=Mode.PRIVATE)
    chafl_n1_piece_7b = split(chafl_n1_piece_7b, bisect_by=Plane(origin=(131.8, 2.281590606, 19.03171372), z_dir=(1, 0, 0)), keep=Keep.TOP, mode=Mode.PRIVATE)
    chafl_n1_piece_7 = chafl_n1_piece_7a & chafl_n1_piece_7b
    add(chafl_n1_piece_7, mode=Mode.SUBTRACT)


solid = part.part
